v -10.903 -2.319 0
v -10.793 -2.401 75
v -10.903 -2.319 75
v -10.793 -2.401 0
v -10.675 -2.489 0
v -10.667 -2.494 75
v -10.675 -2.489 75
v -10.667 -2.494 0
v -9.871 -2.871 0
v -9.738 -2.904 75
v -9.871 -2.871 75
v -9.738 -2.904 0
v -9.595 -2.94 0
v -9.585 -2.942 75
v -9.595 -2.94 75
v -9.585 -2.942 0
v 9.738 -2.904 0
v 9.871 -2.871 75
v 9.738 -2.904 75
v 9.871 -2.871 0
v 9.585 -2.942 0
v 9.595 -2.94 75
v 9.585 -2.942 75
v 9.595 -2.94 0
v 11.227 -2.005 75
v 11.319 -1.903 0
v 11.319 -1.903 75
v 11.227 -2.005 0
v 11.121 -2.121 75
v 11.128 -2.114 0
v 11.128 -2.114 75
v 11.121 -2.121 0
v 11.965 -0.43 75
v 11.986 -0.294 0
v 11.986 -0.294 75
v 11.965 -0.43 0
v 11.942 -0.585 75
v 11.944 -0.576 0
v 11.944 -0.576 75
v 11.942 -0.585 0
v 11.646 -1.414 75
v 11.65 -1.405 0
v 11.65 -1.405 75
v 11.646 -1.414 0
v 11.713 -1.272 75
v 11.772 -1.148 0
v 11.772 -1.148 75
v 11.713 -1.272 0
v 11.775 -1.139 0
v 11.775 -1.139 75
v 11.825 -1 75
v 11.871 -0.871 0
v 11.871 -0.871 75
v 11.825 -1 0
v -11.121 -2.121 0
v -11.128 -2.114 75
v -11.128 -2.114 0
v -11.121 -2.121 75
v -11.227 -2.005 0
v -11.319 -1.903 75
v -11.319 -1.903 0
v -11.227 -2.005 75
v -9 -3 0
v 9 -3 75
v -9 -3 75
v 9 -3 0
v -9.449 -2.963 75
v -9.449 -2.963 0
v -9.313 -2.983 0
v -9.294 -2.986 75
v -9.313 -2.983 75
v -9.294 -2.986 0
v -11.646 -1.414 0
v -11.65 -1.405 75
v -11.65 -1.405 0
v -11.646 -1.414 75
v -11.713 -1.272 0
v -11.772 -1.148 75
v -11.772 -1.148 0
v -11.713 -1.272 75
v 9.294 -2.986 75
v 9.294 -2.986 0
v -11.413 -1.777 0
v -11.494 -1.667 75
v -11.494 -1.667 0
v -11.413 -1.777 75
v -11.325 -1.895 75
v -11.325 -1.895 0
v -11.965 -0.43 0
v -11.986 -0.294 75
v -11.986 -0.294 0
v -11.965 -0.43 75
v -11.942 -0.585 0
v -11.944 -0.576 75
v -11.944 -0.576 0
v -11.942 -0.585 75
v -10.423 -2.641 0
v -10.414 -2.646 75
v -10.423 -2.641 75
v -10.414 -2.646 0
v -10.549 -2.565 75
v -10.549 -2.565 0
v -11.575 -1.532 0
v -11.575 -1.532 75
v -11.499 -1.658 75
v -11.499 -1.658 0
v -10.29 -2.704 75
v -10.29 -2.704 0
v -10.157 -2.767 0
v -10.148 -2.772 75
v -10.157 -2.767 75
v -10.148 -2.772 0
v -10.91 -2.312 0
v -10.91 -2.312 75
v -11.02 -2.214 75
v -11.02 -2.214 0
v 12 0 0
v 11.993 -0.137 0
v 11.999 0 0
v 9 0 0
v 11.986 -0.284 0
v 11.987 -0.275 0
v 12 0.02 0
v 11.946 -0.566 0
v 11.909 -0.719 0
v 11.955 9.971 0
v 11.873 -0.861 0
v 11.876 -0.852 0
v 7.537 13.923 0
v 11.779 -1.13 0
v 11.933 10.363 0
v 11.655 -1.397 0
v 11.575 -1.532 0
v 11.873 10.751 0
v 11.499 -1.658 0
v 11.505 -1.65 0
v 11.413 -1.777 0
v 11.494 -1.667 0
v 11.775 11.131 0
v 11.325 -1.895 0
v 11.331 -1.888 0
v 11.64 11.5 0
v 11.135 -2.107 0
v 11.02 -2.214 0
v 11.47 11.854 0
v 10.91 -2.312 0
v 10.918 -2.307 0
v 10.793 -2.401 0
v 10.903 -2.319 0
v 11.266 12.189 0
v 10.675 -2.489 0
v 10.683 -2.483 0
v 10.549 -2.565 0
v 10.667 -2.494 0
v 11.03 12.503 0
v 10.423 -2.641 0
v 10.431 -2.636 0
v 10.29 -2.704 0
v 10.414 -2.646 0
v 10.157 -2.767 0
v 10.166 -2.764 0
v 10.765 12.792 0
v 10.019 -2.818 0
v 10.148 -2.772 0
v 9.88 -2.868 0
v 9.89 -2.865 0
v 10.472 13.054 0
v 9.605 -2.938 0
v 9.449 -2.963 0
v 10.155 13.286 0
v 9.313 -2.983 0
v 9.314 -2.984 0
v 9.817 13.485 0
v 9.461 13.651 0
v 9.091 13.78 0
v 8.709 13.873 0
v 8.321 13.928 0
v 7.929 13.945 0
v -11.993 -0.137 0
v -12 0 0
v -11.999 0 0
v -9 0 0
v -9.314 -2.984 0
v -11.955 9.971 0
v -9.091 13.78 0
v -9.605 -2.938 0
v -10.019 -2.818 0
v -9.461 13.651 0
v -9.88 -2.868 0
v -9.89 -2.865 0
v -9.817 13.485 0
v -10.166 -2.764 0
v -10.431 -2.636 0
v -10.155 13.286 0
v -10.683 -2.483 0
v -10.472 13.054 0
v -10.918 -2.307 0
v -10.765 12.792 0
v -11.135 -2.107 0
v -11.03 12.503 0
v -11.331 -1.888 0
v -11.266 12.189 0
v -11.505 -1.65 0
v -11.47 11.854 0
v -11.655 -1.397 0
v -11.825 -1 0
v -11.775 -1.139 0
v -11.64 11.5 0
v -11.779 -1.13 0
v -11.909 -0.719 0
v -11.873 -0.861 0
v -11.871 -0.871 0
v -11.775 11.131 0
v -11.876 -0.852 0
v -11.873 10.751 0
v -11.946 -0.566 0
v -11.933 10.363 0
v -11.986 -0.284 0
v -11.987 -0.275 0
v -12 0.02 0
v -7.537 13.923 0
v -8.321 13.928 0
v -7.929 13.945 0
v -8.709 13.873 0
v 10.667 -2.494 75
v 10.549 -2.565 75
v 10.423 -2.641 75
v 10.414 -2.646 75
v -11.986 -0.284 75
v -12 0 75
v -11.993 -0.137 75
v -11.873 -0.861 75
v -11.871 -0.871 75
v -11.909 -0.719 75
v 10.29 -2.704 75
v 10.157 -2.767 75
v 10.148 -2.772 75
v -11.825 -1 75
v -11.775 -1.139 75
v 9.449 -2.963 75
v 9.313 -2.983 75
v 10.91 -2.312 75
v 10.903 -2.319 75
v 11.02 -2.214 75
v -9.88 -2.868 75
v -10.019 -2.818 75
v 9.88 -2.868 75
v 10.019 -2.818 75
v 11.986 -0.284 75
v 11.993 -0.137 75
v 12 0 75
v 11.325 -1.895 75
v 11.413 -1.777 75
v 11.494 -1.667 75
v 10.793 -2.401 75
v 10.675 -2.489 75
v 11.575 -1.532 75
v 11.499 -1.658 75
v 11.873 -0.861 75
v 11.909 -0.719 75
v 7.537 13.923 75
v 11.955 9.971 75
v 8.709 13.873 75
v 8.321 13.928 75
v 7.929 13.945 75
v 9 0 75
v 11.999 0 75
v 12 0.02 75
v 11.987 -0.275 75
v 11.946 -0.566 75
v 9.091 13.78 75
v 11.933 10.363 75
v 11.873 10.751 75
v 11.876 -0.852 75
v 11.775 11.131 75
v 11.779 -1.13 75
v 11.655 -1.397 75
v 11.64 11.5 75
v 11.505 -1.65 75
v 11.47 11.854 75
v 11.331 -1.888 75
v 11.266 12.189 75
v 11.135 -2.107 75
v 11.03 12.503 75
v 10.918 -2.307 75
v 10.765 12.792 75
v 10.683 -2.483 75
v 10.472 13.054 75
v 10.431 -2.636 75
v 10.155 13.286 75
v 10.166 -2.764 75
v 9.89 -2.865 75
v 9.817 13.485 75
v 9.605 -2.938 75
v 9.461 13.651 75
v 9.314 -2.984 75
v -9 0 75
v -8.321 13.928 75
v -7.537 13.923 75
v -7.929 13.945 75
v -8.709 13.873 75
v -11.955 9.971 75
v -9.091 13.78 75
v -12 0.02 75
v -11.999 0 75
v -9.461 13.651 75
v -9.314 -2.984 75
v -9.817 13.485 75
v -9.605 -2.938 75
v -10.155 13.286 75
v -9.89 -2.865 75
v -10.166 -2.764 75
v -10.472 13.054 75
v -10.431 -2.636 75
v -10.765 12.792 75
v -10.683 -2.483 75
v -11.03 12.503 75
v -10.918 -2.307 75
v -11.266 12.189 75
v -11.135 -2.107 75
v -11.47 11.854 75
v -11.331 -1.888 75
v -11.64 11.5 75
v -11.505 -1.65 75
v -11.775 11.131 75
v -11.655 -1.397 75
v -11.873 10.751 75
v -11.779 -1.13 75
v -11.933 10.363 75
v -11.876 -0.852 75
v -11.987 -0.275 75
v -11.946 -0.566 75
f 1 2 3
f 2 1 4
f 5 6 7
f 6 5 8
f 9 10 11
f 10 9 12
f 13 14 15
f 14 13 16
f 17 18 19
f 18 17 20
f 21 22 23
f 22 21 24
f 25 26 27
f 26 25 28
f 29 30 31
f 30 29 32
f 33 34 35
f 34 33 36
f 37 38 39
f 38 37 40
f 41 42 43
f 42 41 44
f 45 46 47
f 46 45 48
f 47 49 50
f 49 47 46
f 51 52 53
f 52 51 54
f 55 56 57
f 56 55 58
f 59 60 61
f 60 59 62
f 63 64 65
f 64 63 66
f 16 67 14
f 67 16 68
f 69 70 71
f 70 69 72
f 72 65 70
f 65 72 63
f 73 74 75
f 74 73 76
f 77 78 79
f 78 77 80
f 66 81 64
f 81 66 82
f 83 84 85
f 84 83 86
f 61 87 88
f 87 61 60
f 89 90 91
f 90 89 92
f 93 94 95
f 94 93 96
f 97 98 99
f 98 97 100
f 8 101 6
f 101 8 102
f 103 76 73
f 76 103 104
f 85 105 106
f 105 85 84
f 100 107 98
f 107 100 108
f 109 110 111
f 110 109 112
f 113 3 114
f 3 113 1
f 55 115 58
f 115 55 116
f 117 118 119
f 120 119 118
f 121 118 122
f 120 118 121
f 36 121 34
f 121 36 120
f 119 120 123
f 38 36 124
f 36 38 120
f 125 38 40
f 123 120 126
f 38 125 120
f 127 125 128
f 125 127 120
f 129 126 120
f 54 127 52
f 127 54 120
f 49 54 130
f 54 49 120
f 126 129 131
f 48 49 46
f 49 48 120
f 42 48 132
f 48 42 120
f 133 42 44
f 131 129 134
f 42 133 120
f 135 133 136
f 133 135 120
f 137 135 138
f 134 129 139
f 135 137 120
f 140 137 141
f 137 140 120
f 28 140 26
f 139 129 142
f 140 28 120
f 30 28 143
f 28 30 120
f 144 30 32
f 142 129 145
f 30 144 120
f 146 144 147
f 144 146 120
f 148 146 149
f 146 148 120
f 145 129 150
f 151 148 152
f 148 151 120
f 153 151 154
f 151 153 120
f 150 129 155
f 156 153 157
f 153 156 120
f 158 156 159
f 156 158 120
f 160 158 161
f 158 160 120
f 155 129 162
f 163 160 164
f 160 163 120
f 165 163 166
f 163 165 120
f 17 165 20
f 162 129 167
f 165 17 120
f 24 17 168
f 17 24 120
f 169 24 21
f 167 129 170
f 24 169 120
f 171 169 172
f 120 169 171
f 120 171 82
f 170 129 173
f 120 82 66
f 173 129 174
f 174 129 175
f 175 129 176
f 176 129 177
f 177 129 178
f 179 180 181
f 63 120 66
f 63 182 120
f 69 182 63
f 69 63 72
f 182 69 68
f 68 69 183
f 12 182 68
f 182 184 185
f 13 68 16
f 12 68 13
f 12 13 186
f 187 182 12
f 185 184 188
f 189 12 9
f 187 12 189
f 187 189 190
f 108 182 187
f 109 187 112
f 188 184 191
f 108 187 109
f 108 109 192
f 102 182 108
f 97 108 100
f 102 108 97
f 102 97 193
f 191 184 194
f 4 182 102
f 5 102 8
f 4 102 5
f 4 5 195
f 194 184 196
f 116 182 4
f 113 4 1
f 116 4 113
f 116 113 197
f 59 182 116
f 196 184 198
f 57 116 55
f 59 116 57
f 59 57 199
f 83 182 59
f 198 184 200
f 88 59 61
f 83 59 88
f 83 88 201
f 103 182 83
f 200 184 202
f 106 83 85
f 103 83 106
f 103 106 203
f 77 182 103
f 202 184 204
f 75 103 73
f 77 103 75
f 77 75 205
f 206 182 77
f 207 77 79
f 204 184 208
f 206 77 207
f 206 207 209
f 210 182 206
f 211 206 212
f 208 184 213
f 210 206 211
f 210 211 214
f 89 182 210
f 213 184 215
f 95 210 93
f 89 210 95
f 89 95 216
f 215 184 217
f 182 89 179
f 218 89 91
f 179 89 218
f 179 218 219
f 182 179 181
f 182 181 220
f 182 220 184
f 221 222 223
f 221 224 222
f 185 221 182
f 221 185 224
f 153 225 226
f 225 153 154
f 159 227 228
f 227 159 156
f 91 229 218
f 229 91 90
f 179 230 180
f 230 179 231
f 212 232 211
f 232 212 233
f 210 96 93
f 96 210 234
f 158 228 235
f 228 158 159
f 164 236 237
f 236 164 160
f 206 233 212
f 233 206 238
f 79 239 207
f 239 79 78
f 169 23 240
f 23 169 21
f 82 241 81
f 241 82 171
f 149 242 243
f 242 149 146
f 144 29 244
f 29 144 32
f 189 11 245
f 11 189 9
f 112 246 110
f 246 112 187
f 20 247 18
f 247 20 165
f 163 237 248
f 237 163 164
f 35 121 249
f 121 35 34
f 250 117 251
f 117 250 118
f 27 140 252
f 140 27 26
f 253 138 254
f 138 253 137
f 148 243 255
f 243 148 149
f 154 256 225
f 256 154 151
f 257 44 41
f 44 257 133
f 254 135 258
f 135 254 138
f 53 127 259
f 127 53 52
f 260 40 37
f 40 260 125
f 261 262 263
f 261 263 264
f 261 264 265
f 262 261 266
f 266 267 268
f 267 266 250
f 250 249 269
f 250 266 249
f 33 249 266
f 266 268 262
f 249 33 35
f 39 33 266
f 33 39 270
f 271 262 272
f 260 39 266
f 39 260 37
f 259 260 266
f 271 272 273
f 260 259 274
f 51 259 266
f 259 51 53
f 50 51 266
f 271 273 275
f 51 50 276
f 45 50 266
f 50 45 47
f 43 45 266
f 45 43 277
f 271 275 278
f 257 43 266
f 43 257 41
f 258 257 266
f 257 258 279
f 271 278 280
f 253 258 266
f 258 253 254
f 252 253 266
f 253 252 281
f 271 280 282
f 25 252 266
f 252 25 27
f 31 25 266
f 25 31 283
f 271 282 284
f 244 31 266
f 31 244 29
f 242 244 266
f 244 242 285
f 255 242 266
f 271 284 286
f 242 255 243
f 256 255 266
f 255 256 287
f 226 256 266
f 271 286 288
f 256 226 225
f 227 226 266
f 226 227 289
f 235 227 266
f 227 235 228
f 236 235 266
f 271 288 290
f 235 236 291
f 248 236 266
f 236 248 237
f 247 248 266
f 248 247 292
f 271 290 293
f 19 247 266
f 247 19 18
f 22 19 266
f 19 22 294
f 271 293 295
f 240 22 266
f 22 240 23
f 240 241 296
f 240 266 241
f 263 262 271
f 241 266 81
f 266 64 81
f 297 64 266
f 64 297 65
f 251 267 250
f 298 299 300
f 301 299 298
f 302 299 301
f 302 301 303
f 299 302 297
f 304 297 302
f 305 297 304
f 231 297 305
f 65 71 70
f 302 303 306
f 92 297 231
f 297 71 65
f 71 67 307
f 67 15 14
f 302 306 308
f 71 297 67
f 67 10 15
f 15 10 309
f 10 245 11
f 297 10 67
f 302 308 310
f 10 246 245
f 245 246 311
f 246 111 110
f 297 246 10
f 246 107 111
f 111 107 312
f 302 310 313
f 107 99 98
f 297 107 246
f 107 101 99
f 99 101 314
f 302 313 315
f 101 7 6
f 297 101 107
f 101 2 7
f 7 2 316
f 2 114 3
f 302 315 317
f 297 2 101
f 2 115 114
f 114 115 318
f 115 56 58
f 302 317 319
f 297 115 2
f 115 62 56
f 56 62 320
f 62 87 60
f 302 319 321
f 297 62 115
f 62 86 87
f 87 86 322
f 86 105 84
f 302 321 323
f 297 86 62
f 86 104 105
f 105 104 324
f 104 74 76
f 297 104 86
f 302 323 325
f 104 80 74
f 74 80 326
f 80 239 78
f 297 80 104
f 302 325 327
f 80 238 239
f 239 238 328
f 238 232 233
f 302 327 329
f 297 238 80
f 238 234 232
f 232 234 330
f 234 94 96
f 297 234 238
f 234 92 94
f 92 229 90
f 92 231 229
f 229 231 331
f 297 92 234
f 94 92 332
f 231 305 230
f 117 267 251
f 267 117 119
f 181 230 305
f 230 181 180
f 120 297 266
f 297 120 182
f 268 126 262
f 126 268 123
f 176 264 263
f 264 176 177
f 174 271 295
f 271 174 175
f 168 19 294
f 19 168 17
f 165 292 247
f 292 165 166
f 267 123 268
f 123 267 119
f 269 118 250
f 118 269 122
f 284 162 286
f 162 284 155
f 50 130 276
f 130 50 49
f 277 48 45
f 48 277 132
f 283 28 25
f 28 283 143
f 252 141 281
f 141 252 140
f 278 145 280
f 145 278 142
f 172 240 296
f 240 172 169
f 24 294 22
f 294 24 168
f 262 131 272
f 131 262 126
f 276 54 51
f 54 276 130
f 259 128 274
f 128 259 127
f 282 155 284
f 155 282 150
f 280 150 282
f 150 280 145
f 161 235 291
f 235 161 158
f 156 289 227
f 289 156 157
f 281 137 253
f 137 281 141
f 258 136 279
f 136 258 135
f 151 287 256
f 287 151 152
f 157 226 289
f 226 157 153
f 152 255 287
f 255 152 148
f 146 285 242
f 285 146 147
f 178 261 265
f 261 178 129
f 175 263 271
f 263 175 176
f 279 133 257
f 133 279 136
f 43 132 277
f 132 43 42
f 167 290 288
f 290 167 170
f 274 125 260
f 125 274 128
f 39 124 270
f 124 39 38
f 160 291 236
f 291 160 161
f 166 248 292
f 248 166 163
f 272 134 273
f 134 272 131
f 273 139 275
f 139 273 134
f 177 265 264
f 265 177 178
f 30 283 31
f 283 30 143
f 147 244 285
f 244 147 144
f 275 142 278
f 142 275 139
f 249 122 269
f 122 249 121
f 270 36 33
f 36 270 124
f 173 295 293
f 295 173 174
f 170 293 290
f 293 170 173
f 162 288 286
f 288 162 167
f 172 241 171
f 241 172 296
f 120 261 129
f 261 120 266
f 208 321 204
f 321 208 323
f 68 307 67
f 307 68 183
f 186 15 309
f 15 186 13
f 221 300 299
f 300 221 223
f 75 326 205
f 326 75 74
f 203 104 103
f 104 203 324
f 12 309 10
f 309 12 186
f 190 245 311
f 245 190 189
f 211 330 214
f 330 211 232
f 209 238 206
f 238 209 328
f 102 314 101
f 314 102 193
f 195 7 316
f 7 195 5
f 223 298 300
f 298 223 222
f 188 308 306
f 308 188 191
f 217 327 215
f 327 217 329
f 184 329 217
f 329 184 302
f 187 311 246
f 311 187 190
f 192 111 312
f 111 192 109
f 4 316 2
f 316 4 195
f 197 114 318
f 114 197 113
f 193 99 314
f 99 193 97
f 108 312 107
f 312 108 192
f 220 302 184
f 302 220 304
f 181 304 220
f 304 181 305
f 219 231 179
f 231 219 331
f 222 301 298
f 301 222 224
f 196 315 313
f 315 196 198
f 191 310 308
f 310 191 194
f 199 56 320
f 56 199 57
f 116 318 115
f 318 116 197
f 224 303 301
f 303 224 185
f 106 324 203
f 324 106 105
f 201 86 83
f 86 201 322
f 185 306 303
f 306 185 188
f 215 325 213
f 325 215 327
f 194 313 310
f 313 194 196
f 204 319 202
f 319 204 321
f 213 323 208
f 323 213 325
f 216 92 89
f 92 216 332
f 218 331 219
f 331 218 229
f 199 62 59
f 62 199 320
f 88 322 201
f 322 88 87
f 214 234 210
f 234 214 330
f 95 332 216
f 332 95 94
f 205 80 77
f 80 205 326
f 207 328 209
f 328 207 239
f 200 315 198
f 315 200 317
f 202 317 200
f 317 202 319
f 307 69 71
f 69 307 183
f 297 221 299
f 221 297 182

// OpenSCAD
$fn=64;

module half_sphered(d, r1, r2, h) {
	difference() {
		hull() {
			translate([-d/2, 0, 0])
				cylinder(r=r1, h=h);
			translate([d/2, 0, 0])
				cylinder(r=r2, h=h);
		}
		translate([-(r1 + r2 + d), 0, -h])
			cube([(r1 + r2 + d)*3, (r1 + r2 + d)*3, 3*h]);
	}
}

half_sphered(18, 3, 3, 75);

module side(sig) {
    translate([sig*18/2, 0, 0])
        rotate([0, 0, sig*96])
            translate([sig*10/2, 0, 0])
                half_sphered(10, 3.5 - 0.5*sig, 3.5 + 0.5*sig, 75);
}

side(1);
side(-1);

// vim: ft=c
